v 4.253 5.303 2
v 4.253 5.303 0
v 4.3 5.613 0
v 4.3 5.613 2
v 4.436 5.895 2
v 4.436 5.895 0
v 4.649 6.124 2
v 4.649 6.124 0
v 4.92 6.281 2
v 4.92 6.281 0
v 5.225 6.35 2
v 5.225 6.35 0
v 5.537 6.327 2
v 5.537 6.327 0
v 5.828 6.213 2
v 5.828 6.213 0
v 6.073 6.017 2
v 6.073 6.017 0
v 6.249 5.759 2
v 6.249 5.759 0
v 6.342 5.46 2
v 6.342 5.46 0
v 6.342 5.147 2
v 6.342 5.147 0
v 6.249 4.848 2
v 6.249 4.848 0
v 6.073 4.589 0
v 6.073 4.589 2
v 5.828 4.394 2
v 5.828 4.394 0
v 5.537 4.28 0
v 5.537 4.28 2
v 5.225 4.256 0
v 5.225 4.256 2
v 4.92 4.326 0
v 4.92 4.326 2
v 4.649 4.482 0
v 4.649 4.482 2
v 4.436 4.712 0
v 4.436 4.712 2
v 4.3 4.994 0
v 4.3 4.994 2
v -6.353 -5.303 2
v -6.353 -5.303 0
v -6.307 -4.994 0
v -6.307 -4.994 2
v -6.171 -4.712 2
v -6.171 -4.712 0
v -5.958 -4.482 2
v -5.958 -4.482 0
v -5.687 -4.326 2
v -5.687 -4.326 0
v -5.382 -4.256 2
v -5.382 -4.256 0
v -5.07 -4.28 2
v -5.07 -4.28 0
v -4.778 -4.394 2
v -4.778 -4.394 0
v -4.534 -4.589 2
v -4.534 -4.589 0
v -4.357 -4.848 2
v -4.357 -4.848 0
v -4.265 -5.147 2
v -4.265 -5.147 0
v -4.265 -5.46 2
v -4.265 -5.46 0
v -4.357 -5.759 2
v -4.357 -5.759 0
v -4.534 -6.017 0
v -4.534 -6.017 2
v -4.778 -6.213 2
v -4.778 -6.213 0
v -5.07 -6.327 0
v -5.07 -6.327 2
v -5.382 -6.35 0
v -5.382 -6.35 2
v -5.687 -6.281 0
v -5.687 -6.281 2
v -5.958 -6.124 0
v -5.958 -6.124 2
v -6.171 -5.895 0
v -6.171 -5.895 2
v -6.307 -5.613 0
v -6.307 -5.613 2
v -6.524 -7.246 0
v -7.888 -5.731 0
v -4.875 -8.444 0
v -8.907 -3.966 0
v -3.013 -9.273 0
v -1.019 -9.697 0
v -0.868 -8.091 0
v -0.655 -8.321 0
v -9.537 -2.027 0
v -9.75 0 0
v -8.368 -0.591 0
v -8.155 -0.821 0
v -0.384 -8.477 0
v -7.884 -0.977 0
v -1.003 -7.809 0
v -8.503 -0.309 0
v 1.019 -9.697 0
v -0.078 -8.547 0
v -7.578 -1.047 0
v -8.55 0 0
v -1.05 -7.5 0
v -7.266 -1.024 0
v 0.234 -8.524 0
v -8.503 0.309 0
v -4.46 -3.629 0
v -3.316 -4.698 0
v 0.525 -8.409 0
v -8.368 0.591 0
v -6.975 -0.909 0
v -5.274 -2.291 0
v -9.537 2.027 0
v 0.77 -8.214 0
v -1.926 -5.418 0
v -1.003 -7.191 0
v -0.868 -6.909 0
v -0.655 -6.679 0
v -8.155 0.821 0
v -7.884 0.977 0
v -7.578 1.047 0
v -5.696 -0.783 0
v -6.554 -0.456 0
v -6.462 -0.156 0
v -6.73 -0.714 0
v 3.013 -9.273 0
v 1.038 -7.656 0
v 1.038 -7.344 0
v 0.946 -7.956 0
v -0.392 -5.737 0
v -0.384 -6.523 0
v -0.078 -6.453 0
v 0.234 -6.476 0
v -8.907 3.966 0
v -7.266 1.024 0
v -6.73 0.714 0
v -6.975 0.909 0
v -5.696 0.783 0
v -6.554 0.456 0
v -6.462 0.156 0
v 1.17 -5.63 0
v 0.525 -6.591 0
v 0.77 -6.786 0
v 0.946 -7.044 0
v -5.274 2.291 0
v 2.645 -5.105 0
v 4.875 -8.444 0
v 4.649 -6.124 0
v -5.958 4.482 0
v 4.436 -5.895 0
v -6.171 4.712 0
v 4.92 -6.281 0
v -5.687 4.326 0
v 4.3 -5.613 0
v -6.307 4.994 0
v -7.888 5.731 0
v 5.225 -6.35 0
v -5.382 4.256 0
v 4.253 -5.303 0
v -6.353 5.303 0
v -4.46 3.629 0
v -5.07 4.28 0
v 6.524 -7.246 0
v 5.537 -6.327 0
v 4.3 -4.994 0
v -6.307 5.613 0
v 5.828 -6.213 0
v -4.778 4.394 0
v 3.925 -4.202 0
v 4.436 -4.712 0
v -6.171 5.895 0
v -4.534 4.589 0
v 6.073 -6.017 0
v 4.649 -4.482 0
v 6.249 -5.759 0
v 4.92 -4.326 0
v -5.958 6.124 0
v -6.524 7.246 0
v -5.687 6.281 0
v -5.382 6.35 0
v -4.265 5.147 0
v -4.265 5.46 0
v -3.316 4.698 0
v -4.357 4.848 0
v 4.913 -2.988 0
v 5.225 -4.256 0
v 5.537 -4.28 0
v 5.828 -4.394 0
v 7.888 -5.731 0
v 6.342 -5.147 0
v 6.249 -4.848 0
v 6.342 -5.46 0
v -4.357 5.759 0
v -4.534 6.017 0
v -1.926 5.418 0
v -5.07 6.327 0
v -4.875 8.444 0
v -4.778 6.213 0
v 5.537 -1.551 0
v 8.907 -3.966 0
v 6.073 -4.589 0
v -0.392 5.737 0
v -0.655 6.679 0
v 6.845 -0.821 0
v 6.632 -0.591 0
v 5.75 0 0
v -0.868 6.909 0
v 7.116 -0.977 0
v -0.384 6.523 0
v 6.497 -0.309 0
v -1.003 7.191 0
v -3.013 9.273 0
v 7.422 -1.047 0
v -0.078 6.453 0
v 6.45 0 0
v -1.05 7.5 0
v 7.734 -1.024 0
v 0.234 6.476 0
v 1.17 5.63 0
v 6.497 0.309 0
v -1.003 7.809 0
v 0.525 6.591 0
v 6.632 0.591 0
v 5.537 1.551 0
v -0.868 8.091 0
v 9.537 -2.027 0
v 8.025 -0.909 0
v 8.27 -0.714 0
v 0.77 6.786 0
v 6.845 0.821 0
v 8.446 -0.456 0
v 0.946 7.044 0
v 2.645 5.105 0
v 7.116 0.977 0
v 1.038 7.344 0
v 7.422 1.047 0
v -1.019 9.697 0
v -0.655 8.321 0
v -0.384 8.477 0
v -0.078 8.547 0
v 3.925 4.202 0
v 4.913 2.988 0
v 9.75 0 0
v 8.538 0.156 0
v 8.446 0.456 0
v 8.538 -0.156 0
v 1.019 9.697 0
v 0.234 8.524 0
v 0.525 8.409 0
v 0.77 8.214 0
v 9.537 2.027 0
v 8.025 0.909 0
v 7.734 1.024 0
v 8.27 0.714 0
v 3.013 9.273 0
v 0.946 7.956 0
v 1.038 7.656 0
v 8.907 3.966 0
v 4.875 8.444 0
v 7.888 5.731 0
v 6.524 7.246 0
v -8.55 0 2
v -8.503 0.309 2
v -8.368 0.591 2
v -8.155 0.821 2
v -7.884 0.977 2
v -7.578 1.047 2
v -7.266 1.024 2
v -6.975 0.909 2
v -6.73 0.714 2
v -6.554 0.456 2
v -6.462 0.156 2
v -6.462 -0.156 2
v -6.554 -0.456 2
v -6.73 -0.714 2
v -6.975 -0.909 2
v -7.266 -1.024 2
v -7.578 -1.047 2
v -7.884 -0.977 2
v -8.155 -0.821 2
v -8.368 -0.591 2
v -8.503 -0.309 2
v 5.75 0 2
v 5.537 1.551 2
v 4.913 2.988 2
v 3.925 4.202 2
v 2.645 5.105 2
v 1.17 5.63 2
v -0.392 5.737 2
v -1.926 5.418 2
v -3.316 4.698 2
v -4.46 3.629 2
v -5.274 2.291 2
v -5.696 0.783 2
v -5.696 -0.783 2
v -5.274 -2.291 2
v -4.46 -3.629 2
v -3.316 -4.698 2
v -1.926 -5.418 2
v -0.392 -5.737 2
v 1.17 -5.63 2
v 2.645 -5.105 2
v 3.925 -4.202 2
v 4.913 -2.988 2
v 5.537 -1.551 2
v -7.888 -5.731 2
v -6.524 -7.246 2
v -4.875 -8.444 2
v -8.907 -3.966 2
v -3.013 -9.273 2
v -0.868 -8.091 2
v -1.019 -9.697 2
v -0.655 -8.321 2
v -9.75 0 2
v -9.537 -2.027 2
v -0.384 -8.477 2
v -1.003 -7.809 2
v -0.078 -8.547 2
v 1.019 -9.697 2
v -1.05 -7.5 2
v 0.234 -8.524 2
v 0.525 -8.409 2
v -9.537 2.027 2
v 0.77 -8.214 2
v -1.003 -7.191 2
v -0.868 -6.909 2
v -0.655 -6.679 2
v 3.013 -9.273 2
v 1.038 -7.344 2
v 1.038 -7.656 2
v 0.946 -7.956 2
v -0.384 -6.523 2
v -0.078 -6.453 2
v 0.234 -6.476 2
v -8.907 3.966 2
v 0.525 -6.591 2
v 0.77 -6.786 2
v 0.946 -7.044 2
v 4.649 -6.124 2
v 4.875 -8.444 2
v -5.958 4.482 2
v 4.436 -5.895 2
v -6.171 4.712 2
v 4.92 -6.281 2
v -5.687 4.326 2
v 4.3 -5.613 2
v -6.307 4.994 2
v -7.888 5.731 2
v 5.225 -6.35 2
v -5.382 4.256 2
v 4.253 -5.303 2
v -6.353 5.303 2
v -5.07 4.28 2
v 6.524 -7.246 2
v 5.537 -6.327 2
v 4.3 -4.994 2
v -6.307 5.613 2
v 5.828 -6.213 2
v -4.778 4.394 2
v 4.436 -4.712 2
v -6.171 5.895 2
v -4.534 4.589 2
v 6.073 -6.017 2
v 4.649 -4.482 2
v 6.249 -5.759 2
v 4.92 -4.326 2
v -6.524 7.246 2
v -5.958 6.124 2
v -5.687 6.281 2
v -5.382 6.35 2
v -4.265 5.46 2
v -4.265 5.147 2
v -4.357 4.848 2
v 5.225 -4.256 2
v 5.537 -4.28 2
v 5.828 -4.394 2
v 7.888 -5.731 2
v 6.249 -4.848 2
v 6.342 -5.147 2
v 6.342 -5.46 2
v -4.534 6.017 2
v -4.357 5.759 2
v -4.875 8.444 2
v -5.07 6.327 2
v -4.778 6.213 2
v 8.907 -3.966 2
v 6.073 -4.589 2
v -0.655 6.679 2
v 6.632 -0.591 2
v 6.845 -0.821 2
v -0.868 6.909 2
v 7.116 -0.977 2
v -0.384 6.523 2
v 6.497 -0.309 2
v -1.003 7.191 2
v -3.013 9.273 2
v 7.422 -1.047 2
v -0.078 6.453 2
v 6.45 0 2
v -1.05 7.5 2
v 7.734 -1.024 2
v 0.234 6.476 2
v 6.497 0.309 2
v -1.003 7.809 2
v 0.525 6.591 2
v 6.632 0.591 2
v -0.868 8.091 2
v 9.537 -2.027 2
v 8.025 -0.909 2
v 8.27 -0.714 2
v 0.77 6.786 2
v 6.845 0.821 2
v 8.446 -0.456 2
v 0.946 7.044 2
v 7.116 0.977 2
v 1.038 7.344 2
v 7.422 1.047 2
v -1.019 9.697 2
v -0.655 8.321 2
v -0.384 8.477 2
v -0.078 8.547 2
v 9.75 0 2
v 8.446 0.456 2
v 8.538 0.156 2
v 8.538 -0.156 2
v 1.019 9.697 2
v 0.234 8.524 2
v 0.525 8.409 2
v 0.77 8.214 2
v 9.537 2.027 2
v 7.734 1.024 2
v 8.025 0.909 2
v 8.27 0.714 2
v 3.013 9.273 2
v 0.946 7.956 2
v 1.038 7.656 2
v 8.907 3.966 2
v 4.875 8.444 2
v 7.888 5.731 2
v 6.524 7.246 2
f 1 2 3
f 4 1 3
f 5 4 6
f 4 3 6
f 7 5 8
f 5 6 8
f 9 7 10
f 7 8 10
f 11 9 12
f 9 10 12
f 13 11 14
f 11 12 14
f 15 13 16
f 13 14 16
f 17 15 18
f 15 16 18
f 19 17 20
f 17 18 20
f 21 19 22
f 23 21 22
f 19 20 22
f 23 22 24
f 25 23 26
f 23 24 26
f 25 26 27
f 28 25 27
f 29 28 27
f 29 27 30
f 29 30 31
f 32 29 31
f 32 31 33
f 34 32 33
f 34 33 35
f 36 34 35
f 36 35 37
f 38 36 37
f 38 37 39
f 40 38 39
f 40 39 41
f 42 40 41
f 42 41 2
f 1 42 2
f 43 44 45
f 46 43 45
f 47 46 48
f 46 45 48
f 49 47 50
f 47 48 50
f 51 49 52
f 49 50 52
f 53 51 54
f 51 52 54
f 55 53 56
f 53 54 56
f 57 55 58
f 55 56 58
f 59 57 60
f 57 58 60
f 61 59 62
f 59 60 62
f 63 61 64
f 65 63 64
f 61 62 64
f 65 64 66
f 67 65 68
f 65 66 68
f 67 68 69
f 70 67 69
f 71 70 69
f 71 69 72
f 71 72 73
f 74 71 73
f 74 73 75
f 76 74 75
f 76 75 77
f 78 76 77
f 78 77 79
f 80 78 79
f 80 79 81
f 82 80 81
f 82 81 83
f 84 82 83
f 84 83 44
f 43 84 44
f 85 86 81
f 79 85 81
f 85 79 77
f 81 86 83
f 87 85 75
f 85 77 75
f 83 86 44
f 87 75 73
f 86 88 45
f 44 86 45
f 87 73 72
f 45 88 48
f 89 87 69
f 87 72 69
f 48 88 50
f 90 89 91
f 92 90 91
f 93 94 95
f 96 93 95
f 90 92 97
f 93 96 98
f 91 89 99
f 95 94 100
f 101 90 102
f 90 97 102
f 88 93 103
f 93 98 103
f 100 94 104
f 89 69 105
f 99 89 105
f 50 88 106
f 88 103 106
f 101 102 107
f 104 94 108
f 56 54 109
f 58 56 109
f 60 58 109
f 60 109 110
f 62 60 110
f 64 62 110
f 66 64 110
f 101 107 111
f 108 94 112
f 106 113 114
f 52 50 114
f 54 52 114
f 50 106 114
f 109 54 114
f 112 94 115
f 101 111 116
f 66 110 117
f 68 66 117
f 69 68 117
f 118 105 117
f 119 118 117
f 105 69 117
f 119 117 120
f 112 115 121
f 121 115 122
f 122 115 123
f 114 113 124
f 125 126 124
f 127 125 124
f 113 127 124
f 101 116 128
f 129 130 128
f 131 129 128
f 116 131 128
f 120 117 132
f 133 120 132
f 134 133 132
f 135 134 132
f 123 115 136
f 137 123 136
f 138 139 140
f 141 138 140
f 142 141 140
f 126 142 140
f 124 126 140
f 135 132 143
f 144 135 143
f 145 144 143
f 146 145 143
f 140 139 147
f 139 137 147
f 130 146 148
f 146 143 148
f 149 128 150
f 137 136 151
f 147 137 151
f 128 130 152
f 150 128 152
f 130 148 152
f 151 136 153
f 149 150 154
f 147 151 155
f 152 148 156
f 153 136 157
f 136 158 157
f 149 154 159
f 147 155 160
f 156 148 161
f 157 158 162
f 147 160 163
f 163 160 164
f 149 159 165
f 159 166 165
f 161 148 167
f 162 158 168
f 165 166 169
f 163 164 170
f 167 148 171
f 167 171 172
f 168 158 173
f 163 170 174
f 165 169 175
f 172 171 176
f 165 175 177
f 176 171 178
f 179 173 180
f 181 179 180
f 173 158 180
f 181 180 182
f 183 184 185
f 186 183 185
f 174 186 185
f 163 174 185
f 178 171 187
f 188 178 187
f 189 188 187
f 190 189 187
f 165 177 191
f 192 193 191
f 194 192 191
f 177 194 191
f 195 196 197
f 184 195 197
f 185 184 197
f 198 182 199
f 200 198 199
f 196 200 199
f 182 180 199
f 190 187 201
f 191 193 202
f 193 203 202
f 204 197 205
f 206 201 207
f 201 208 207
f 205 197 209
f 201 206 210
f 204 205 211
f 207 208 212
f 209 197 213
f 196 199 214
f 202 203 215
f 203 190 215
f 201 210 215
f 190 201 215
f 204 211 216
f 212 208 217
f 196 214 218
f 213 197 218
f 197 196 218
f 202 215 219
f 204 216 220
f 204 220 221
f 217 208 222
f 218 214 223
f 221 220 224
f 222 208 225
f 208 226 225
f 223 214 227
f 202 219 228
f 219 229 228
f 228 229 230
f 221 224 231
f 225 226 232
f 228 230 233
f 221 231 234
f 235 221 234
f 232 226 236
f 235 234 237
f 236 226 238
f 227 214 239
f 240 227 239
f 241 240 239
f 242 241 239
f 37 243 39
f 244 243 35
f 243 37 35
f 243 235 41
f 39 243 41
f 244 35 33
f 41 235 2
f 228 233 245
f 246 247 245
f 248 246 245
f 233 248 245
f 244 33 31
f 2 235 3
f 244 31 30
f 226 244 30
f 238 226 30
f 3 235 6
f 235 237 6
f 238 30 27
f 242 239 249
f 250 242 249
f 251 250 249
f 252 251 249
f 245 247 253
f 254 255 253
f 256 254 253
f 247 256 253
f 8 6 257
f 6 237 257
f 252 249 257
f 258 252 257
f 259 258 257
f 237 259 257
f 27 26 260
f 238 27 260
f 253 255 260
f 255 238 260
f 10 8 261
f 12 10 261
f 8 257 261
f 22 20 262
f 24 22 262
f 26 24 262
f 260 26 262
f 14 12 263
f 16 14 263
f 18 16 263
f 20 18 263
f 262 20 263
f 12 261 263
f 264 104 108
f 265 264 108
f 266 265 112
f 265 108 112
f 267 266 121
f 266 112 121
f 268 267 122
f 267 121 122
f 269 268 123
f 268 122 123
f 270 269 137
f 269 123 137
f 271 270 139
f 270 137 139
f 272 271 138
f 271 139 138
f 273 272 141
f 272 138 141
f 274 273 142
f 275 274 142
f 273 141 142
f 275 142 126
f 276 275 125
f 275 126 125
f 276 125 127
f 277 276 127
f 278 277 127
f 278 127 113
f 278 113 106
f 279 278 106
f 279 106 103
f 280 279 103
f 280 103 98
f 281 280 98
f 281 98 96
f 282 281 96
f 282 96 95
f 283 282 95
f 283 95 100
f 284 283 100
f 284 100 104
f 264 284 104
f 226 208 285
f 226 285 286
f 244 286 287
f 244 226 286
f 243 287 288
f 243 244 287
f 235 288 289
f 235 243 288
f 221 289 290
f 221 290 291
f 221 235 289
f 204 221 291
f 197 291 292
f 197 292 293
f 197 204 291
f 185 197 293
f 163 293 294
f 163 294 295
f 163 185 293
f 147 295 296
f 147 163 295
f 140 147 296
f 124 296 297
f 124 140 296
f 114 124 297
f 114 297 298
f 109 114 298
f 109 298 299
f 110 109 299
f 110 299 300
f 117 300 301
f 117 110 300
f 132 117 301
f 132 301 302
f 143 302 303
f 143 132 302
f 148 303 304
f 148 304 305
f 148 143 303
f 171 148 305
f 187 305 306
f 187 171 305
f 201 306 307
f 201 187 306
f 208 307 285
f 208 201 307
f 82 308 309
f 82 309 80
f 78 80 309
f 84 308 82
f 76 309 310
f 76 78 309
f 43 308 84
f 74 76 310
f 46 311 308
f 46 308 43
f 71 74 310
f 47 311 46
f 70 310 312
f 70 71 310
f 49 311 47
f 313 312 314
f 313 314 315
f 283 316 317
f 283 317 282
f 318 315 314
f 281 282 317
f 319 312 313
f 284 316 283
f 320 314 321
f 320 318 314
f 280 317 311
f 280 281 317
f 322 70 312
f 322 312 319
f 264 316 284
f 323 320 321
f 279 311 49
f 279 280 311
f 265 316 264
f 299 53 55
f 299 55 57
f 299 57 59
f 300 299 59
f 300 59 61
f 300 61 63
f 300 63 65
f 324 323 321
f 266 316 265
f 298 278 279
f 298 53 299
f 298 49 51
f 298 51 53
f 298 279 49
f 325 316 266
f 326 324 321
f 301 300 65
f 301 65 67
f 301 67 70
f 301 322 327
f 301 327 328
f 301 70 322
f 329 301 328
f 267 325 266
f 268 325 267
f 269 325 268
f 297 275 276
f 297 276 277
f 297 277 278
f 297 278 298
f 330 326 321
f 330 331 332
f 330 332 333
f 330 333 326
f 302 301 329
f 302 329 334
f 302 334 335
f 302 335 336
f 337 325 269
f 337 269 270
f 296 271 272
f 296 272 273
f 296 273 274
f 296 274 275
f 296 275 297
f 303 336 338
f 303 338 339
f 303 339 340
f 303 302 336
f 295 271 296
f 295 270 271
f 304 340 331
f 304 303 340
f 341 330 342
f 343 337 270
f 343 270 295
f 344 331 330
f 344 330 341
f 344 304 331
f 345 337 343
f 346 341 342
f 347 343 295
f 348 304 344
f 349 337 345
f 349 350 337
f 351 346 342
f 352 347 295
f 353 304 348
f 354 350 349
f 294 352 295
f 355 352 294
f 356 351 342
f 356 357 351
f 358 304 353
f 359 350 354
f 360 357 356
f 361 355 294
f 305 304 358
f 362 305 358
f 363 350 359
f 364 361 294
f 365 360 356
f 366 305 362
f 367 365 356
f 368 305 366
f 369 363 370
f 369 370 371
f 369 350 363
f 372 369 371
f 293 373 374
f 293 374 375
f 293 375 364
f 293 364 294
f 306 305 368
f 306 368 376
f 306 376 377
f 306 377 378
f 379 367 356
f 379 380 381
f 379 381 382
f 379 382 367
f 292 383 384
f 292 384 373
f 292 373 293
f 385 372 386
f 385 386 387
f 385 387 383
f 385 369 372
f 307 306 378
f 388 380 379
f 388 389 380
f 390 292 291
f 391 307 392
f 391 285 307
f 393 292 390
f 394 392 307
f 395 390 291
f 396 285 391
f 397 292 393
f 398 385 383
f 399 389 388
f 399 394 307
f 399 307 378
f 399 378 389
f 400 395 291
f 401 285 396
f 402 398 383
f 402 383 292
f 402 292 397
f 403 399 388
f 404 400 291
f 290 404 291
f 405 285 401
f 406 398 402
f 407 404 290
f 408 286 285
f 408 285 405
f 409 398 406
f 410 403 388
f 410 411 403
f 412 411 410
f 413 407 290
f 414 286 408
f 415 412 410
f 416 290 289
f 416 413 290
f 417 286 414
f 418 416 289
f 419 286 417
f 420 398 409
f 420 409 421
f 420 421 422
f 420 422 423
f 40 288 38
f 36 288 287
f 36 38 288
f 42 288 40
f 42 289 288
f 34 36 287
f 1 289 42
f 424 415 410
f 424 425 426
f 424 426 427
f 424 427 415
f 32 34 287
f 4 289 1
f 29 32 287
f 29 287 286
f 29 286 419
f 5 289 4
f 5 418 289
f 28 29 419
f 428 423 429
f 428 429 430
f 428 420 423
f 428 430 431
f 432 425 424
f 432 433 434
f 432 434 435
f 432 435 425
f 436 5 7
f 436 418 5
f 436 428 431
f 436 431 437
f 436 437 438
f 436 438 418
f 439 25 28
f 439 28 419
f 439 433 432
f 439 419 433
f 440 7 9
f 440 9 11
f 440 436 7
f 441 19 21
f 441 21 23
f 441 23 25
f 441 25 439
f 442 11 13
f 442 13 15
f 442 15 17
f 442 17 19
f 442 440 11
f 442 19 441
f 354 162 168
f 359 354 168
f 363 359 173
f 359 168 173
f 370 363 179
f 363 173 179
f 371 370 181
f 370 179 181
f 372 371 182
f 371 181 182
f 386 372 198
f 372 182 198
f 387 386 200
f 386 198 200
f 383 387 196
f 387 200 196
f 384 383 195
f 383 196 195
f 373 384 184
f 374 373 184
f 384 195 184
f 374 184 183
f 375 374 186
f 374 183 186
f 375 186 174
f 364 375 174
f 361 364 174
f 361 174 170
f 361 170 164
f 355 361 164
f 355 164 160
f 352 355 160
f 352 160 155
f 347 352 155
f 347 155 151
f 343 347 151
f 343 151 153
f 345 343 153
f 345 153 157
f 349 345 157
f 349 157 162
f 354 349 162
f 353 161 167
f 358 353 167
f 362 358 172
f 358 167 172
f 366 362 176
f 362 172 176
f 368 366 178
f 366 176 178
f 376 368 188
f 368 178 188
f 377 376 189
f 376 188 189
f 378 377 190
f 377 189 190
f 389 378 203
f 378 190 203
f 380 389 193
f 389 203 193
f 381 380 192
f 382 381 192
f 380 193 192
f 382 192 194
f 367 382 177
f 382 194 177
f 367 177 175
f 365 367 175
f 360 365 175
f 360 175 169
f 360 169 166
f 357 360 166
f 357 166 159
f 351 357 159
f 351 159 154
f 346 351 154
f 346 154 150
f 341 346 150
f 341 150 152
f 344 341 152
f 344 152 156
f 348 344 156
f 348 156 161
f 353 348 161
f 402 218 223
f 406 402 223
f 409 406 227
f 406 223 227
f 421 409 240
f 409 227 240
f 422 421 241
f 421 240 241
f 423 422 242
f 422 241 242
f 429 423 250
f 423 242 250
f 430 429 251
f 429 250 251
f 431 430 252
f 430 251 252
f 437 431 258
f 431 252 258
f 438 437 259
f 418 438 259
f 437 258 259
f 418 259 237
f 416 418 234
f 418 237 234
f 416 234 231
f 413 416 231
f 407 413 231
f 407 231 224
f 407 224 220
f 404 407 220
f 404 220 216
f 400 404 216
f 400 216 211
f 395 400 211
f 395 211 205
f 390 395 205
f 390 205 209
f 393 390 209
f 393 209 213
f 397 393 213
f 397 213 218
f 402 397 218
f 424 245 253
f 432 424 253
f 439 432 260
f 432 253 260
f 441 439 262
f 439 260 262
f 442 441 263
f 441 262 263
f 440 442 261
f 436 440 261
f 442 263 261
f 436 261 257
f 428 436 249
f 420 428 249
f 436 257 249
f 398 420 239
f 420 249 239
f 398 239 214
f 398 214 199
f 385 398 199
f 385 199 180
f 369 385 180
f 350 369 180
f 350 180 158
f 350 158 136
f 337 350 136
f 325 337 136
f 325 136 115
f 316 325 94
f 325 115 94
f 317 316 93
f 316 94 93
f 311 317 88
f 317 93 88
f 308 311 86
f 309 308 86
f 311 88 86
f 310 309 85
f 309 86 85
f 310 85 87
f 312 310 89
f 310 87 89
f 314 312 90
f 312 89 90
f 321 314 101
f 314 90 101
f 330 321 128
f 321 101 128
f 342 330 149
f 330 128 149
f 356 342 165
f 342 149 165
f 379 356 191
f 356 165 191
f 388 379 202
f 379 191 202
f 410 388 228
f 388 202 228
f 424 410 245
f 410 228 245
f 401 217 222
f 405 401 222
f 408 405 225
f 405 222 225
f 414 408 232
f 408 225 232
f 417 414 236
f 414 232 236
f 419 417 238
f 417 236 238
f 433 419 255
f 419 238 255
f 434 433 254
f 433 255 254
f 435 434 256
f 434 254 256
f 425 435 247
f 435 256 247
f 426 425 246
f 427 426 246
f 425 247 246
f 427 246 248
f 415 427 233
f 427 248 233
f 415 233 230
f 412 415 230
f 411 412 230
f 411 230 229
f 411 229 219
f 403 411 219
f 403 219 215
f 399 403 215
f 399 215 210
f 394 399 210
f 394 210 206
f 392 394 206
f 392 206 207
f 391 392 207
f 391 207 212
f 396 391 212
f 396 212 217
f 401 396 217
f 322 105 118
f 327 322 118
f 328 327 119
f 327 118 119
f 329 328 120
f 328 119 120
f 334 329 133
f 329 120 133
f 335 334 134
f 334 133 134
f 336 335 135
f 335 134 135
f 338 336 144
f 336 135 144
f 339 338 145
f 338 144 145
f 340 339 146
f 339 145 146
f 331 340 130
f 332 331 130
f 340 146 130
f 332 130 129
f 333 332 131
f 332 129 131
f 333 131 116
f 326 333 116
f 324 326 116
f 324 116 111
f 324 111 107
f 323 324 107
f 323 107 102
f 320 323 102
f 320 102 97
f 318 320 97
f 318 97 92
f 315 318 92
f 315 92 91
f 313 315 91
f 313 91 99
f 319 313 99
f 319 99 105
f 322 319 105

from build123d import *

# Parameters (mm, degrees)
SKETCH2_R           = 9.75
SKETCH2_R_2         = 5.75
BOSS_EXTRUDE1_DEPTH = 2
SKETCH4_R           = 1.05
CUT_EXTRUDE1_DEPTH  = 3


with BuildPart() as part:
    # Sketch2 → Boss-Extrude1 (new body)
    with BuildSketch(Plane.XY):
        Circle(SKETCH2_R)
        Circle(SKETCH2_R_2, mode=Mode.SUBTRACT)
    extrude(amount=BOSS_EXTRUDE1_DEPTH)

    # Sketch4 → Cut-Extrude1 (cut, through all)
    with BuildSketch(Plane(origin=(0, 0, 0), x_dir=(-1, 0, 0), z_dir=(0, 0, -1))):
        with Locations((0, 7.5)):
            Circle(SKETCH4_R)
        with Locations((5.303300859, 5.303300859)):
            Circle(SKETCH4_R)
        with Locations((7.5, 0)):
            Circle(SKETCH4_R)
        with Locations((5.303300859, -5.303300859)):
            Circle(SKETCH4_R)
        with Locations((0, -7.5)):
            Circle(SKETCH4_R)
        with Locations((-5.303300859, -5.303300859)):
            Circle(SKETCH4_R)
        with Locations((-7.5, 0)):
            Circle(SKETCH4_R)
        with Locations((-5.303300859, 5.303300859)):
            Circle(SKETCH4_R)
    extrude(amount=-CUT_EXTRUDE1_DEPTH, mode=Mode.SUBTRACT)


solid = part.part
